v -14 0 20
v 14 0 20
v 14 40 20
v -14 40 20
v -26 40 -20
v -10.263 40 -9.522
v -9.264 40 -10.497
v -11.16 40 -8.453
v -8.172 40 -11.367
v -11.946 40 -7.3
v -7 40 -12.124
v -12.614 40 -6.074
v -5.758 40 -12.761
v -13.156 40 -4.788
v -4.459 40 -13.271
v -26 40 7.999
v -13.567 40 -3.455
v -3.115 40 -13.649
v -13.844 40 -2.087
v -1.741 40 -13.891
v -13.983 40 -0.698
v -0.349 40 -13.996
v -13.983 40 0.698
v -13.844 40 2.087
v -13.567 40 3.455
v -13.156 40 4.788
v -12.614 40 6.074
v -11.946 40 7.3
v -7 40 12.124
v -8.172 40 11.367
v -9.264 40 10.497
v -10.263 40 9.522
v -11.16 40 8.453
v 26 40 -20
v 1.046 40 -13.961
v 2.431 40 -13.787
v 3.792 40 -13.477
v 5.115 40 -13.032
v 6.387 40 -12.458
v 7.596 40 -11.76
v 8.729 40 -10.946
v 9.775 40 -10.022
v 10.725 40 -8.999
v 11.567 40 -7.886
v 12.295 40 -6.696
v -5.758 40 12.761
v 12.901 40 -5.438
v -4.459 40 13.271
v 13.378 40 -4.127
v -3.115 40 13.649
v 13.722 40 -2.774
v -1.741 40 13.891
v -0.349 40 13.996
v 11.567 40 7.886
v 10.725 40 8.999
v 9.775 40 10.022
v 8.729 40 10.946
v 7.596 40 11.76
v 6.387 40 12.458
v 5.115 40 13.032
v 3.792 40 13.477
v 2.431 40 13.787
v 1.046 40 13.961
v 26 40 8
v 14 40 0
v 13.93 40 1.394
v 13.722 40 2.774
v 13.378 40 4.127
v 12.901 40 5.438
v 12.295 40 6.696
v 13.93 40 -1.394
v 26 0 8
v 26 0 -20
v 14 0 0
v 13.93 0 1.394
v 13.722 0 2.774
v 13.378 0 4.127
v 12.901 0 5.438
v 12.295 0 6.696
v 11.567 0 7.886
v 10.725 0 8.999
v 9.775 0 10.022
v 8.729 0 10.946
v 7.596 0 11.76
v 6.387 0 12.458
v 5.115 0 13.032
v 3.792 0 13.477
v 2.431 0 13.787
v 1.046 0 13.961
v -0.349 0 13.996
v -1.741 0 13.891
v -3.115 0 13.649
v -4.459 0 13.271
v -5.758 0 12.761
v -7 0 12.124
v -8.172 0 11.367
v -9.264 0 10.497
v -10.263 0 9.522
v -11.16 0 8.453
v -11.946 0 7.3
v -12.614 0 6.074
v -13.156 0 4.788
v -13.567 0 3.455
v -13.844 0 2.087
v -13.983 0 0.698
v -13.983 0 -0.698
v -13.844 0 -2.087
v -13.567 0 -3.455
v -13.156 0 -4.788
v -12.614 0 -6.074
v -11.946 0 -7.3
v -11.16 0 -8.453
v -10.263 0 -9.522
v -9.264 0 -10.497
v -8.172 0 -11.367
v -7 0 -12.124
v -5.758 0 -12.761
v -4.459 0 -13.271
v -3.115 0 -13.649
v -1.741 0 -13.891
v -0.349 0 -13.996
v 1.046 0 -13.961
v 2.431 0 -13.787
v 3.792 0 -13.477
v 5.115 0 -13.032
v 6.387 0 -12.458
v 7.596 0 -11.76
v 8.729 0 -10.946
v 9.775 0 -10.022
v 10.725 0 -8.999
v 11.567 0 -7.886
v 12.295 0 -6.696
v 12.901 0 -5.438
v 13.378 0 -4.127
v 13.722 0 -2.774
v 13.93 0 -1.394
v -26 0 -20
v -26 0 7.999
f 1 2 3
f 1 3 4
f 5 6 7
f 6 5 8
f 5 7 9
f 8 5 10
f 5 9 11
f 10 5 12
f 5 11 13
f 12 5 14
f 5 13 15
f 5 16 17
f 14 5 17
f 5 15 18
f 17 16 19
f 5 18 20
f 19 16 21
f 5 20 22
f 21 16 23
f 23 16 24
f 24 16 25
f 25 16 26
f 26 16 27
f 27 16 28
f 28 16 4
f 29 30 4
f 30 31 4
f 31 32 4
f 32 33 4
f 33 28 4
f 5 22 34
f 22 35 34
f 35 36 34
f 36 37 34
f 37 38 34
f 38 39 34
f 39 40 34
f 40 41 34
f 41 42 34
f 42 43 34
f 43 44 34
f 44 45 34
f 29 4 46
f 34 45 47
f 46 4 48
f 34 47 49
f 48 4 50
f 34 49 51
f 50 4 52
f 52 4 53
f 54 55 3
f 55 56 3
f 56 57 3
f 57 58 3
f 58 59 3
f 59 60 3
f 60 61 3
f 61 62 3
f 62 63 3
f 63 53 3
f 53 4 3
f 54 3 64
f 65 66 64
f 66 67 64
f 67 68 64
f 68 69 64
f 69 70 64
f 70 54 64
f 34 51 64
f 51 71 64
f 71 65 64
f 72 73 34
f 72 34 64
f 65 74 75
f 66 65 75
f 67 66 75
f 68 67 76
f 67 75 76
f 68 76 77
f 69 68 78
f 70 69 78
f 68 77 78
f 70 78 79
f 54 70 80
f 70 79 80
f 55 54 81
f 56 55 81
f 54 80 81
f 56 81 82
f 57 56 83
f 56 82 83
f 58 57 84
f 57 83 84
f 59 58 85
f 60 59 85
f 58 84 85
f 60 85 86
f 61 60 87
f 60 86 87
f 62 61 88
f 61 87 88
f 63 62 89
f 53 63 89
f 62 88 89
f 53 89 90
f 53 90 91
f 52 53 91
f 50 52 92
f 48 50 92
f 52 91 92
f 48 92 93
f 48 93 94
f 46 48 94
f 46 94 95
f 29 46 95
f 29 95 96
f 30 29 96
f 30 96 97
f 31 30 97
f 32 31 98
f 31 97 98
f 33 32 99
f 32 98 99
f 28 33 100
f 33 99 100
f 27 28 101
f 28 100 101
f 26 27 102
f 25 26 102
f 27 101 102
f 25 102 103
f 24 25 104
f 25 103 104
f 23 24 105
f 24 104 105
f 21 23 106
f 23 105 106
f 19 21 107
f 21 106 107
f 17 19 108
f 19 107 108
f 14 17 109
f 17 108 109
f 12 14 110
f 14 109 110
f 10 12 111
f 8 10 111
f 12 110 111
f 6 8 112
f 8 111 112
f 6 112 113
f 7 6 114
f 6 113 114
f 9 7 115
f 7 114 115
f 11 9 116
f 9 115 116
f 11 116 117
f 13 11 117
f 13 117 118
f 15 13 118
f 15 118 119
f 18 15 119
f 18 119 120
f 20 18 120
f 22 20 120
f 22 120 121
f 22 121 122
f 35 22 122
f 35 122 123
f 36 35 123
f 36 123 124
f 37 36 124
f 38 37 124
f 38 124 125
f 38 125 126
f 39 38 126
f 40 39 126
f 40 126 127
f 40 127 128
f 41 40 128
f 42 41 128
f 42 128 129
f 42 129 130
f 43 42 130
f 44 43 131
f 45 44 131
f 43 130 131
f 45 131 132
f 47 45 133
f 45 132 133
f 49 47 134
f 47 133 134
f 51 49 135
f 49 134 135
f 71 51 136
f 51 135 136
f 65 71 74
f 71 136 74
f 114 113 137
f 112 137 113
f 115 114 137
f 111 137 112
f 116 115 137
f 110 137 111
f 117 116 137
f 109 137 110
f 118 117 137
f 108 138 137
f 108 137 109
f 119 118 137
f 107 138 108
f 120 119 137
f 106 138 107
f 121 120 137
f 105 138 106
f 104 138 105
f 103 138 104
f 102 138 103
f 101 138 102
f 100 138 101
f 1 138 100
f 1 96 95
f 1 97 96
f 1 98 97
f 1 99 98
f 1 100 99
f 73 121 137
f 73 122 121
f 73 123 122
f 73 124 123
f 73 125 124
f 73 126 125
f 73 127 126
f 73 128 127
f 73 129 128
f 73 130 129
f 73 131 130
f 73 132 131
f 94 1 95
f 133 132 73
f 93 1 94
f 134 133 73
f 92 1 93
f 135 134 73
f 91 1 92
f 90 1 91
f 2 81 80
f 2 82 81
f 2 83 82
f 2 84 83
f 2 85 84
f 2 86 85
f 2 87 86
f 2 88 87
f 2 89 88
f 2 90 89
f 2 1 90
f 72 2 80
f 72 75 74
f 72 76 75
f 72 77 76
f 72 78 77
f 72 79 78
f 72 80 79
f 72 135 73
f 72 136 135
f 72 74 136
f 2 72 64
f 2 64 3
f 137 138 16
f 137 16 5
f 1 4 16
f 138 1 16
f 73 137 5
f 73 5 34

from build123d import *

# Parameters (mm, degrees)
F0_R     = 14
F1_DEPTH = 40


with BuildPart() as f1:
    # F0 (on Front) → F1 (new body)
    with BuildSketch(Plane.XZ):
        Polygon((13.999691, 20), (-14, 20), (-26, 7.999382), (-26, -20), (26, -20), (26, 7.999691), align=None)
        Circle(F0_R, mode=Mode.SUBTRACT)
    extrude(amount=-F1_DEPTH)


solid = f1.part
